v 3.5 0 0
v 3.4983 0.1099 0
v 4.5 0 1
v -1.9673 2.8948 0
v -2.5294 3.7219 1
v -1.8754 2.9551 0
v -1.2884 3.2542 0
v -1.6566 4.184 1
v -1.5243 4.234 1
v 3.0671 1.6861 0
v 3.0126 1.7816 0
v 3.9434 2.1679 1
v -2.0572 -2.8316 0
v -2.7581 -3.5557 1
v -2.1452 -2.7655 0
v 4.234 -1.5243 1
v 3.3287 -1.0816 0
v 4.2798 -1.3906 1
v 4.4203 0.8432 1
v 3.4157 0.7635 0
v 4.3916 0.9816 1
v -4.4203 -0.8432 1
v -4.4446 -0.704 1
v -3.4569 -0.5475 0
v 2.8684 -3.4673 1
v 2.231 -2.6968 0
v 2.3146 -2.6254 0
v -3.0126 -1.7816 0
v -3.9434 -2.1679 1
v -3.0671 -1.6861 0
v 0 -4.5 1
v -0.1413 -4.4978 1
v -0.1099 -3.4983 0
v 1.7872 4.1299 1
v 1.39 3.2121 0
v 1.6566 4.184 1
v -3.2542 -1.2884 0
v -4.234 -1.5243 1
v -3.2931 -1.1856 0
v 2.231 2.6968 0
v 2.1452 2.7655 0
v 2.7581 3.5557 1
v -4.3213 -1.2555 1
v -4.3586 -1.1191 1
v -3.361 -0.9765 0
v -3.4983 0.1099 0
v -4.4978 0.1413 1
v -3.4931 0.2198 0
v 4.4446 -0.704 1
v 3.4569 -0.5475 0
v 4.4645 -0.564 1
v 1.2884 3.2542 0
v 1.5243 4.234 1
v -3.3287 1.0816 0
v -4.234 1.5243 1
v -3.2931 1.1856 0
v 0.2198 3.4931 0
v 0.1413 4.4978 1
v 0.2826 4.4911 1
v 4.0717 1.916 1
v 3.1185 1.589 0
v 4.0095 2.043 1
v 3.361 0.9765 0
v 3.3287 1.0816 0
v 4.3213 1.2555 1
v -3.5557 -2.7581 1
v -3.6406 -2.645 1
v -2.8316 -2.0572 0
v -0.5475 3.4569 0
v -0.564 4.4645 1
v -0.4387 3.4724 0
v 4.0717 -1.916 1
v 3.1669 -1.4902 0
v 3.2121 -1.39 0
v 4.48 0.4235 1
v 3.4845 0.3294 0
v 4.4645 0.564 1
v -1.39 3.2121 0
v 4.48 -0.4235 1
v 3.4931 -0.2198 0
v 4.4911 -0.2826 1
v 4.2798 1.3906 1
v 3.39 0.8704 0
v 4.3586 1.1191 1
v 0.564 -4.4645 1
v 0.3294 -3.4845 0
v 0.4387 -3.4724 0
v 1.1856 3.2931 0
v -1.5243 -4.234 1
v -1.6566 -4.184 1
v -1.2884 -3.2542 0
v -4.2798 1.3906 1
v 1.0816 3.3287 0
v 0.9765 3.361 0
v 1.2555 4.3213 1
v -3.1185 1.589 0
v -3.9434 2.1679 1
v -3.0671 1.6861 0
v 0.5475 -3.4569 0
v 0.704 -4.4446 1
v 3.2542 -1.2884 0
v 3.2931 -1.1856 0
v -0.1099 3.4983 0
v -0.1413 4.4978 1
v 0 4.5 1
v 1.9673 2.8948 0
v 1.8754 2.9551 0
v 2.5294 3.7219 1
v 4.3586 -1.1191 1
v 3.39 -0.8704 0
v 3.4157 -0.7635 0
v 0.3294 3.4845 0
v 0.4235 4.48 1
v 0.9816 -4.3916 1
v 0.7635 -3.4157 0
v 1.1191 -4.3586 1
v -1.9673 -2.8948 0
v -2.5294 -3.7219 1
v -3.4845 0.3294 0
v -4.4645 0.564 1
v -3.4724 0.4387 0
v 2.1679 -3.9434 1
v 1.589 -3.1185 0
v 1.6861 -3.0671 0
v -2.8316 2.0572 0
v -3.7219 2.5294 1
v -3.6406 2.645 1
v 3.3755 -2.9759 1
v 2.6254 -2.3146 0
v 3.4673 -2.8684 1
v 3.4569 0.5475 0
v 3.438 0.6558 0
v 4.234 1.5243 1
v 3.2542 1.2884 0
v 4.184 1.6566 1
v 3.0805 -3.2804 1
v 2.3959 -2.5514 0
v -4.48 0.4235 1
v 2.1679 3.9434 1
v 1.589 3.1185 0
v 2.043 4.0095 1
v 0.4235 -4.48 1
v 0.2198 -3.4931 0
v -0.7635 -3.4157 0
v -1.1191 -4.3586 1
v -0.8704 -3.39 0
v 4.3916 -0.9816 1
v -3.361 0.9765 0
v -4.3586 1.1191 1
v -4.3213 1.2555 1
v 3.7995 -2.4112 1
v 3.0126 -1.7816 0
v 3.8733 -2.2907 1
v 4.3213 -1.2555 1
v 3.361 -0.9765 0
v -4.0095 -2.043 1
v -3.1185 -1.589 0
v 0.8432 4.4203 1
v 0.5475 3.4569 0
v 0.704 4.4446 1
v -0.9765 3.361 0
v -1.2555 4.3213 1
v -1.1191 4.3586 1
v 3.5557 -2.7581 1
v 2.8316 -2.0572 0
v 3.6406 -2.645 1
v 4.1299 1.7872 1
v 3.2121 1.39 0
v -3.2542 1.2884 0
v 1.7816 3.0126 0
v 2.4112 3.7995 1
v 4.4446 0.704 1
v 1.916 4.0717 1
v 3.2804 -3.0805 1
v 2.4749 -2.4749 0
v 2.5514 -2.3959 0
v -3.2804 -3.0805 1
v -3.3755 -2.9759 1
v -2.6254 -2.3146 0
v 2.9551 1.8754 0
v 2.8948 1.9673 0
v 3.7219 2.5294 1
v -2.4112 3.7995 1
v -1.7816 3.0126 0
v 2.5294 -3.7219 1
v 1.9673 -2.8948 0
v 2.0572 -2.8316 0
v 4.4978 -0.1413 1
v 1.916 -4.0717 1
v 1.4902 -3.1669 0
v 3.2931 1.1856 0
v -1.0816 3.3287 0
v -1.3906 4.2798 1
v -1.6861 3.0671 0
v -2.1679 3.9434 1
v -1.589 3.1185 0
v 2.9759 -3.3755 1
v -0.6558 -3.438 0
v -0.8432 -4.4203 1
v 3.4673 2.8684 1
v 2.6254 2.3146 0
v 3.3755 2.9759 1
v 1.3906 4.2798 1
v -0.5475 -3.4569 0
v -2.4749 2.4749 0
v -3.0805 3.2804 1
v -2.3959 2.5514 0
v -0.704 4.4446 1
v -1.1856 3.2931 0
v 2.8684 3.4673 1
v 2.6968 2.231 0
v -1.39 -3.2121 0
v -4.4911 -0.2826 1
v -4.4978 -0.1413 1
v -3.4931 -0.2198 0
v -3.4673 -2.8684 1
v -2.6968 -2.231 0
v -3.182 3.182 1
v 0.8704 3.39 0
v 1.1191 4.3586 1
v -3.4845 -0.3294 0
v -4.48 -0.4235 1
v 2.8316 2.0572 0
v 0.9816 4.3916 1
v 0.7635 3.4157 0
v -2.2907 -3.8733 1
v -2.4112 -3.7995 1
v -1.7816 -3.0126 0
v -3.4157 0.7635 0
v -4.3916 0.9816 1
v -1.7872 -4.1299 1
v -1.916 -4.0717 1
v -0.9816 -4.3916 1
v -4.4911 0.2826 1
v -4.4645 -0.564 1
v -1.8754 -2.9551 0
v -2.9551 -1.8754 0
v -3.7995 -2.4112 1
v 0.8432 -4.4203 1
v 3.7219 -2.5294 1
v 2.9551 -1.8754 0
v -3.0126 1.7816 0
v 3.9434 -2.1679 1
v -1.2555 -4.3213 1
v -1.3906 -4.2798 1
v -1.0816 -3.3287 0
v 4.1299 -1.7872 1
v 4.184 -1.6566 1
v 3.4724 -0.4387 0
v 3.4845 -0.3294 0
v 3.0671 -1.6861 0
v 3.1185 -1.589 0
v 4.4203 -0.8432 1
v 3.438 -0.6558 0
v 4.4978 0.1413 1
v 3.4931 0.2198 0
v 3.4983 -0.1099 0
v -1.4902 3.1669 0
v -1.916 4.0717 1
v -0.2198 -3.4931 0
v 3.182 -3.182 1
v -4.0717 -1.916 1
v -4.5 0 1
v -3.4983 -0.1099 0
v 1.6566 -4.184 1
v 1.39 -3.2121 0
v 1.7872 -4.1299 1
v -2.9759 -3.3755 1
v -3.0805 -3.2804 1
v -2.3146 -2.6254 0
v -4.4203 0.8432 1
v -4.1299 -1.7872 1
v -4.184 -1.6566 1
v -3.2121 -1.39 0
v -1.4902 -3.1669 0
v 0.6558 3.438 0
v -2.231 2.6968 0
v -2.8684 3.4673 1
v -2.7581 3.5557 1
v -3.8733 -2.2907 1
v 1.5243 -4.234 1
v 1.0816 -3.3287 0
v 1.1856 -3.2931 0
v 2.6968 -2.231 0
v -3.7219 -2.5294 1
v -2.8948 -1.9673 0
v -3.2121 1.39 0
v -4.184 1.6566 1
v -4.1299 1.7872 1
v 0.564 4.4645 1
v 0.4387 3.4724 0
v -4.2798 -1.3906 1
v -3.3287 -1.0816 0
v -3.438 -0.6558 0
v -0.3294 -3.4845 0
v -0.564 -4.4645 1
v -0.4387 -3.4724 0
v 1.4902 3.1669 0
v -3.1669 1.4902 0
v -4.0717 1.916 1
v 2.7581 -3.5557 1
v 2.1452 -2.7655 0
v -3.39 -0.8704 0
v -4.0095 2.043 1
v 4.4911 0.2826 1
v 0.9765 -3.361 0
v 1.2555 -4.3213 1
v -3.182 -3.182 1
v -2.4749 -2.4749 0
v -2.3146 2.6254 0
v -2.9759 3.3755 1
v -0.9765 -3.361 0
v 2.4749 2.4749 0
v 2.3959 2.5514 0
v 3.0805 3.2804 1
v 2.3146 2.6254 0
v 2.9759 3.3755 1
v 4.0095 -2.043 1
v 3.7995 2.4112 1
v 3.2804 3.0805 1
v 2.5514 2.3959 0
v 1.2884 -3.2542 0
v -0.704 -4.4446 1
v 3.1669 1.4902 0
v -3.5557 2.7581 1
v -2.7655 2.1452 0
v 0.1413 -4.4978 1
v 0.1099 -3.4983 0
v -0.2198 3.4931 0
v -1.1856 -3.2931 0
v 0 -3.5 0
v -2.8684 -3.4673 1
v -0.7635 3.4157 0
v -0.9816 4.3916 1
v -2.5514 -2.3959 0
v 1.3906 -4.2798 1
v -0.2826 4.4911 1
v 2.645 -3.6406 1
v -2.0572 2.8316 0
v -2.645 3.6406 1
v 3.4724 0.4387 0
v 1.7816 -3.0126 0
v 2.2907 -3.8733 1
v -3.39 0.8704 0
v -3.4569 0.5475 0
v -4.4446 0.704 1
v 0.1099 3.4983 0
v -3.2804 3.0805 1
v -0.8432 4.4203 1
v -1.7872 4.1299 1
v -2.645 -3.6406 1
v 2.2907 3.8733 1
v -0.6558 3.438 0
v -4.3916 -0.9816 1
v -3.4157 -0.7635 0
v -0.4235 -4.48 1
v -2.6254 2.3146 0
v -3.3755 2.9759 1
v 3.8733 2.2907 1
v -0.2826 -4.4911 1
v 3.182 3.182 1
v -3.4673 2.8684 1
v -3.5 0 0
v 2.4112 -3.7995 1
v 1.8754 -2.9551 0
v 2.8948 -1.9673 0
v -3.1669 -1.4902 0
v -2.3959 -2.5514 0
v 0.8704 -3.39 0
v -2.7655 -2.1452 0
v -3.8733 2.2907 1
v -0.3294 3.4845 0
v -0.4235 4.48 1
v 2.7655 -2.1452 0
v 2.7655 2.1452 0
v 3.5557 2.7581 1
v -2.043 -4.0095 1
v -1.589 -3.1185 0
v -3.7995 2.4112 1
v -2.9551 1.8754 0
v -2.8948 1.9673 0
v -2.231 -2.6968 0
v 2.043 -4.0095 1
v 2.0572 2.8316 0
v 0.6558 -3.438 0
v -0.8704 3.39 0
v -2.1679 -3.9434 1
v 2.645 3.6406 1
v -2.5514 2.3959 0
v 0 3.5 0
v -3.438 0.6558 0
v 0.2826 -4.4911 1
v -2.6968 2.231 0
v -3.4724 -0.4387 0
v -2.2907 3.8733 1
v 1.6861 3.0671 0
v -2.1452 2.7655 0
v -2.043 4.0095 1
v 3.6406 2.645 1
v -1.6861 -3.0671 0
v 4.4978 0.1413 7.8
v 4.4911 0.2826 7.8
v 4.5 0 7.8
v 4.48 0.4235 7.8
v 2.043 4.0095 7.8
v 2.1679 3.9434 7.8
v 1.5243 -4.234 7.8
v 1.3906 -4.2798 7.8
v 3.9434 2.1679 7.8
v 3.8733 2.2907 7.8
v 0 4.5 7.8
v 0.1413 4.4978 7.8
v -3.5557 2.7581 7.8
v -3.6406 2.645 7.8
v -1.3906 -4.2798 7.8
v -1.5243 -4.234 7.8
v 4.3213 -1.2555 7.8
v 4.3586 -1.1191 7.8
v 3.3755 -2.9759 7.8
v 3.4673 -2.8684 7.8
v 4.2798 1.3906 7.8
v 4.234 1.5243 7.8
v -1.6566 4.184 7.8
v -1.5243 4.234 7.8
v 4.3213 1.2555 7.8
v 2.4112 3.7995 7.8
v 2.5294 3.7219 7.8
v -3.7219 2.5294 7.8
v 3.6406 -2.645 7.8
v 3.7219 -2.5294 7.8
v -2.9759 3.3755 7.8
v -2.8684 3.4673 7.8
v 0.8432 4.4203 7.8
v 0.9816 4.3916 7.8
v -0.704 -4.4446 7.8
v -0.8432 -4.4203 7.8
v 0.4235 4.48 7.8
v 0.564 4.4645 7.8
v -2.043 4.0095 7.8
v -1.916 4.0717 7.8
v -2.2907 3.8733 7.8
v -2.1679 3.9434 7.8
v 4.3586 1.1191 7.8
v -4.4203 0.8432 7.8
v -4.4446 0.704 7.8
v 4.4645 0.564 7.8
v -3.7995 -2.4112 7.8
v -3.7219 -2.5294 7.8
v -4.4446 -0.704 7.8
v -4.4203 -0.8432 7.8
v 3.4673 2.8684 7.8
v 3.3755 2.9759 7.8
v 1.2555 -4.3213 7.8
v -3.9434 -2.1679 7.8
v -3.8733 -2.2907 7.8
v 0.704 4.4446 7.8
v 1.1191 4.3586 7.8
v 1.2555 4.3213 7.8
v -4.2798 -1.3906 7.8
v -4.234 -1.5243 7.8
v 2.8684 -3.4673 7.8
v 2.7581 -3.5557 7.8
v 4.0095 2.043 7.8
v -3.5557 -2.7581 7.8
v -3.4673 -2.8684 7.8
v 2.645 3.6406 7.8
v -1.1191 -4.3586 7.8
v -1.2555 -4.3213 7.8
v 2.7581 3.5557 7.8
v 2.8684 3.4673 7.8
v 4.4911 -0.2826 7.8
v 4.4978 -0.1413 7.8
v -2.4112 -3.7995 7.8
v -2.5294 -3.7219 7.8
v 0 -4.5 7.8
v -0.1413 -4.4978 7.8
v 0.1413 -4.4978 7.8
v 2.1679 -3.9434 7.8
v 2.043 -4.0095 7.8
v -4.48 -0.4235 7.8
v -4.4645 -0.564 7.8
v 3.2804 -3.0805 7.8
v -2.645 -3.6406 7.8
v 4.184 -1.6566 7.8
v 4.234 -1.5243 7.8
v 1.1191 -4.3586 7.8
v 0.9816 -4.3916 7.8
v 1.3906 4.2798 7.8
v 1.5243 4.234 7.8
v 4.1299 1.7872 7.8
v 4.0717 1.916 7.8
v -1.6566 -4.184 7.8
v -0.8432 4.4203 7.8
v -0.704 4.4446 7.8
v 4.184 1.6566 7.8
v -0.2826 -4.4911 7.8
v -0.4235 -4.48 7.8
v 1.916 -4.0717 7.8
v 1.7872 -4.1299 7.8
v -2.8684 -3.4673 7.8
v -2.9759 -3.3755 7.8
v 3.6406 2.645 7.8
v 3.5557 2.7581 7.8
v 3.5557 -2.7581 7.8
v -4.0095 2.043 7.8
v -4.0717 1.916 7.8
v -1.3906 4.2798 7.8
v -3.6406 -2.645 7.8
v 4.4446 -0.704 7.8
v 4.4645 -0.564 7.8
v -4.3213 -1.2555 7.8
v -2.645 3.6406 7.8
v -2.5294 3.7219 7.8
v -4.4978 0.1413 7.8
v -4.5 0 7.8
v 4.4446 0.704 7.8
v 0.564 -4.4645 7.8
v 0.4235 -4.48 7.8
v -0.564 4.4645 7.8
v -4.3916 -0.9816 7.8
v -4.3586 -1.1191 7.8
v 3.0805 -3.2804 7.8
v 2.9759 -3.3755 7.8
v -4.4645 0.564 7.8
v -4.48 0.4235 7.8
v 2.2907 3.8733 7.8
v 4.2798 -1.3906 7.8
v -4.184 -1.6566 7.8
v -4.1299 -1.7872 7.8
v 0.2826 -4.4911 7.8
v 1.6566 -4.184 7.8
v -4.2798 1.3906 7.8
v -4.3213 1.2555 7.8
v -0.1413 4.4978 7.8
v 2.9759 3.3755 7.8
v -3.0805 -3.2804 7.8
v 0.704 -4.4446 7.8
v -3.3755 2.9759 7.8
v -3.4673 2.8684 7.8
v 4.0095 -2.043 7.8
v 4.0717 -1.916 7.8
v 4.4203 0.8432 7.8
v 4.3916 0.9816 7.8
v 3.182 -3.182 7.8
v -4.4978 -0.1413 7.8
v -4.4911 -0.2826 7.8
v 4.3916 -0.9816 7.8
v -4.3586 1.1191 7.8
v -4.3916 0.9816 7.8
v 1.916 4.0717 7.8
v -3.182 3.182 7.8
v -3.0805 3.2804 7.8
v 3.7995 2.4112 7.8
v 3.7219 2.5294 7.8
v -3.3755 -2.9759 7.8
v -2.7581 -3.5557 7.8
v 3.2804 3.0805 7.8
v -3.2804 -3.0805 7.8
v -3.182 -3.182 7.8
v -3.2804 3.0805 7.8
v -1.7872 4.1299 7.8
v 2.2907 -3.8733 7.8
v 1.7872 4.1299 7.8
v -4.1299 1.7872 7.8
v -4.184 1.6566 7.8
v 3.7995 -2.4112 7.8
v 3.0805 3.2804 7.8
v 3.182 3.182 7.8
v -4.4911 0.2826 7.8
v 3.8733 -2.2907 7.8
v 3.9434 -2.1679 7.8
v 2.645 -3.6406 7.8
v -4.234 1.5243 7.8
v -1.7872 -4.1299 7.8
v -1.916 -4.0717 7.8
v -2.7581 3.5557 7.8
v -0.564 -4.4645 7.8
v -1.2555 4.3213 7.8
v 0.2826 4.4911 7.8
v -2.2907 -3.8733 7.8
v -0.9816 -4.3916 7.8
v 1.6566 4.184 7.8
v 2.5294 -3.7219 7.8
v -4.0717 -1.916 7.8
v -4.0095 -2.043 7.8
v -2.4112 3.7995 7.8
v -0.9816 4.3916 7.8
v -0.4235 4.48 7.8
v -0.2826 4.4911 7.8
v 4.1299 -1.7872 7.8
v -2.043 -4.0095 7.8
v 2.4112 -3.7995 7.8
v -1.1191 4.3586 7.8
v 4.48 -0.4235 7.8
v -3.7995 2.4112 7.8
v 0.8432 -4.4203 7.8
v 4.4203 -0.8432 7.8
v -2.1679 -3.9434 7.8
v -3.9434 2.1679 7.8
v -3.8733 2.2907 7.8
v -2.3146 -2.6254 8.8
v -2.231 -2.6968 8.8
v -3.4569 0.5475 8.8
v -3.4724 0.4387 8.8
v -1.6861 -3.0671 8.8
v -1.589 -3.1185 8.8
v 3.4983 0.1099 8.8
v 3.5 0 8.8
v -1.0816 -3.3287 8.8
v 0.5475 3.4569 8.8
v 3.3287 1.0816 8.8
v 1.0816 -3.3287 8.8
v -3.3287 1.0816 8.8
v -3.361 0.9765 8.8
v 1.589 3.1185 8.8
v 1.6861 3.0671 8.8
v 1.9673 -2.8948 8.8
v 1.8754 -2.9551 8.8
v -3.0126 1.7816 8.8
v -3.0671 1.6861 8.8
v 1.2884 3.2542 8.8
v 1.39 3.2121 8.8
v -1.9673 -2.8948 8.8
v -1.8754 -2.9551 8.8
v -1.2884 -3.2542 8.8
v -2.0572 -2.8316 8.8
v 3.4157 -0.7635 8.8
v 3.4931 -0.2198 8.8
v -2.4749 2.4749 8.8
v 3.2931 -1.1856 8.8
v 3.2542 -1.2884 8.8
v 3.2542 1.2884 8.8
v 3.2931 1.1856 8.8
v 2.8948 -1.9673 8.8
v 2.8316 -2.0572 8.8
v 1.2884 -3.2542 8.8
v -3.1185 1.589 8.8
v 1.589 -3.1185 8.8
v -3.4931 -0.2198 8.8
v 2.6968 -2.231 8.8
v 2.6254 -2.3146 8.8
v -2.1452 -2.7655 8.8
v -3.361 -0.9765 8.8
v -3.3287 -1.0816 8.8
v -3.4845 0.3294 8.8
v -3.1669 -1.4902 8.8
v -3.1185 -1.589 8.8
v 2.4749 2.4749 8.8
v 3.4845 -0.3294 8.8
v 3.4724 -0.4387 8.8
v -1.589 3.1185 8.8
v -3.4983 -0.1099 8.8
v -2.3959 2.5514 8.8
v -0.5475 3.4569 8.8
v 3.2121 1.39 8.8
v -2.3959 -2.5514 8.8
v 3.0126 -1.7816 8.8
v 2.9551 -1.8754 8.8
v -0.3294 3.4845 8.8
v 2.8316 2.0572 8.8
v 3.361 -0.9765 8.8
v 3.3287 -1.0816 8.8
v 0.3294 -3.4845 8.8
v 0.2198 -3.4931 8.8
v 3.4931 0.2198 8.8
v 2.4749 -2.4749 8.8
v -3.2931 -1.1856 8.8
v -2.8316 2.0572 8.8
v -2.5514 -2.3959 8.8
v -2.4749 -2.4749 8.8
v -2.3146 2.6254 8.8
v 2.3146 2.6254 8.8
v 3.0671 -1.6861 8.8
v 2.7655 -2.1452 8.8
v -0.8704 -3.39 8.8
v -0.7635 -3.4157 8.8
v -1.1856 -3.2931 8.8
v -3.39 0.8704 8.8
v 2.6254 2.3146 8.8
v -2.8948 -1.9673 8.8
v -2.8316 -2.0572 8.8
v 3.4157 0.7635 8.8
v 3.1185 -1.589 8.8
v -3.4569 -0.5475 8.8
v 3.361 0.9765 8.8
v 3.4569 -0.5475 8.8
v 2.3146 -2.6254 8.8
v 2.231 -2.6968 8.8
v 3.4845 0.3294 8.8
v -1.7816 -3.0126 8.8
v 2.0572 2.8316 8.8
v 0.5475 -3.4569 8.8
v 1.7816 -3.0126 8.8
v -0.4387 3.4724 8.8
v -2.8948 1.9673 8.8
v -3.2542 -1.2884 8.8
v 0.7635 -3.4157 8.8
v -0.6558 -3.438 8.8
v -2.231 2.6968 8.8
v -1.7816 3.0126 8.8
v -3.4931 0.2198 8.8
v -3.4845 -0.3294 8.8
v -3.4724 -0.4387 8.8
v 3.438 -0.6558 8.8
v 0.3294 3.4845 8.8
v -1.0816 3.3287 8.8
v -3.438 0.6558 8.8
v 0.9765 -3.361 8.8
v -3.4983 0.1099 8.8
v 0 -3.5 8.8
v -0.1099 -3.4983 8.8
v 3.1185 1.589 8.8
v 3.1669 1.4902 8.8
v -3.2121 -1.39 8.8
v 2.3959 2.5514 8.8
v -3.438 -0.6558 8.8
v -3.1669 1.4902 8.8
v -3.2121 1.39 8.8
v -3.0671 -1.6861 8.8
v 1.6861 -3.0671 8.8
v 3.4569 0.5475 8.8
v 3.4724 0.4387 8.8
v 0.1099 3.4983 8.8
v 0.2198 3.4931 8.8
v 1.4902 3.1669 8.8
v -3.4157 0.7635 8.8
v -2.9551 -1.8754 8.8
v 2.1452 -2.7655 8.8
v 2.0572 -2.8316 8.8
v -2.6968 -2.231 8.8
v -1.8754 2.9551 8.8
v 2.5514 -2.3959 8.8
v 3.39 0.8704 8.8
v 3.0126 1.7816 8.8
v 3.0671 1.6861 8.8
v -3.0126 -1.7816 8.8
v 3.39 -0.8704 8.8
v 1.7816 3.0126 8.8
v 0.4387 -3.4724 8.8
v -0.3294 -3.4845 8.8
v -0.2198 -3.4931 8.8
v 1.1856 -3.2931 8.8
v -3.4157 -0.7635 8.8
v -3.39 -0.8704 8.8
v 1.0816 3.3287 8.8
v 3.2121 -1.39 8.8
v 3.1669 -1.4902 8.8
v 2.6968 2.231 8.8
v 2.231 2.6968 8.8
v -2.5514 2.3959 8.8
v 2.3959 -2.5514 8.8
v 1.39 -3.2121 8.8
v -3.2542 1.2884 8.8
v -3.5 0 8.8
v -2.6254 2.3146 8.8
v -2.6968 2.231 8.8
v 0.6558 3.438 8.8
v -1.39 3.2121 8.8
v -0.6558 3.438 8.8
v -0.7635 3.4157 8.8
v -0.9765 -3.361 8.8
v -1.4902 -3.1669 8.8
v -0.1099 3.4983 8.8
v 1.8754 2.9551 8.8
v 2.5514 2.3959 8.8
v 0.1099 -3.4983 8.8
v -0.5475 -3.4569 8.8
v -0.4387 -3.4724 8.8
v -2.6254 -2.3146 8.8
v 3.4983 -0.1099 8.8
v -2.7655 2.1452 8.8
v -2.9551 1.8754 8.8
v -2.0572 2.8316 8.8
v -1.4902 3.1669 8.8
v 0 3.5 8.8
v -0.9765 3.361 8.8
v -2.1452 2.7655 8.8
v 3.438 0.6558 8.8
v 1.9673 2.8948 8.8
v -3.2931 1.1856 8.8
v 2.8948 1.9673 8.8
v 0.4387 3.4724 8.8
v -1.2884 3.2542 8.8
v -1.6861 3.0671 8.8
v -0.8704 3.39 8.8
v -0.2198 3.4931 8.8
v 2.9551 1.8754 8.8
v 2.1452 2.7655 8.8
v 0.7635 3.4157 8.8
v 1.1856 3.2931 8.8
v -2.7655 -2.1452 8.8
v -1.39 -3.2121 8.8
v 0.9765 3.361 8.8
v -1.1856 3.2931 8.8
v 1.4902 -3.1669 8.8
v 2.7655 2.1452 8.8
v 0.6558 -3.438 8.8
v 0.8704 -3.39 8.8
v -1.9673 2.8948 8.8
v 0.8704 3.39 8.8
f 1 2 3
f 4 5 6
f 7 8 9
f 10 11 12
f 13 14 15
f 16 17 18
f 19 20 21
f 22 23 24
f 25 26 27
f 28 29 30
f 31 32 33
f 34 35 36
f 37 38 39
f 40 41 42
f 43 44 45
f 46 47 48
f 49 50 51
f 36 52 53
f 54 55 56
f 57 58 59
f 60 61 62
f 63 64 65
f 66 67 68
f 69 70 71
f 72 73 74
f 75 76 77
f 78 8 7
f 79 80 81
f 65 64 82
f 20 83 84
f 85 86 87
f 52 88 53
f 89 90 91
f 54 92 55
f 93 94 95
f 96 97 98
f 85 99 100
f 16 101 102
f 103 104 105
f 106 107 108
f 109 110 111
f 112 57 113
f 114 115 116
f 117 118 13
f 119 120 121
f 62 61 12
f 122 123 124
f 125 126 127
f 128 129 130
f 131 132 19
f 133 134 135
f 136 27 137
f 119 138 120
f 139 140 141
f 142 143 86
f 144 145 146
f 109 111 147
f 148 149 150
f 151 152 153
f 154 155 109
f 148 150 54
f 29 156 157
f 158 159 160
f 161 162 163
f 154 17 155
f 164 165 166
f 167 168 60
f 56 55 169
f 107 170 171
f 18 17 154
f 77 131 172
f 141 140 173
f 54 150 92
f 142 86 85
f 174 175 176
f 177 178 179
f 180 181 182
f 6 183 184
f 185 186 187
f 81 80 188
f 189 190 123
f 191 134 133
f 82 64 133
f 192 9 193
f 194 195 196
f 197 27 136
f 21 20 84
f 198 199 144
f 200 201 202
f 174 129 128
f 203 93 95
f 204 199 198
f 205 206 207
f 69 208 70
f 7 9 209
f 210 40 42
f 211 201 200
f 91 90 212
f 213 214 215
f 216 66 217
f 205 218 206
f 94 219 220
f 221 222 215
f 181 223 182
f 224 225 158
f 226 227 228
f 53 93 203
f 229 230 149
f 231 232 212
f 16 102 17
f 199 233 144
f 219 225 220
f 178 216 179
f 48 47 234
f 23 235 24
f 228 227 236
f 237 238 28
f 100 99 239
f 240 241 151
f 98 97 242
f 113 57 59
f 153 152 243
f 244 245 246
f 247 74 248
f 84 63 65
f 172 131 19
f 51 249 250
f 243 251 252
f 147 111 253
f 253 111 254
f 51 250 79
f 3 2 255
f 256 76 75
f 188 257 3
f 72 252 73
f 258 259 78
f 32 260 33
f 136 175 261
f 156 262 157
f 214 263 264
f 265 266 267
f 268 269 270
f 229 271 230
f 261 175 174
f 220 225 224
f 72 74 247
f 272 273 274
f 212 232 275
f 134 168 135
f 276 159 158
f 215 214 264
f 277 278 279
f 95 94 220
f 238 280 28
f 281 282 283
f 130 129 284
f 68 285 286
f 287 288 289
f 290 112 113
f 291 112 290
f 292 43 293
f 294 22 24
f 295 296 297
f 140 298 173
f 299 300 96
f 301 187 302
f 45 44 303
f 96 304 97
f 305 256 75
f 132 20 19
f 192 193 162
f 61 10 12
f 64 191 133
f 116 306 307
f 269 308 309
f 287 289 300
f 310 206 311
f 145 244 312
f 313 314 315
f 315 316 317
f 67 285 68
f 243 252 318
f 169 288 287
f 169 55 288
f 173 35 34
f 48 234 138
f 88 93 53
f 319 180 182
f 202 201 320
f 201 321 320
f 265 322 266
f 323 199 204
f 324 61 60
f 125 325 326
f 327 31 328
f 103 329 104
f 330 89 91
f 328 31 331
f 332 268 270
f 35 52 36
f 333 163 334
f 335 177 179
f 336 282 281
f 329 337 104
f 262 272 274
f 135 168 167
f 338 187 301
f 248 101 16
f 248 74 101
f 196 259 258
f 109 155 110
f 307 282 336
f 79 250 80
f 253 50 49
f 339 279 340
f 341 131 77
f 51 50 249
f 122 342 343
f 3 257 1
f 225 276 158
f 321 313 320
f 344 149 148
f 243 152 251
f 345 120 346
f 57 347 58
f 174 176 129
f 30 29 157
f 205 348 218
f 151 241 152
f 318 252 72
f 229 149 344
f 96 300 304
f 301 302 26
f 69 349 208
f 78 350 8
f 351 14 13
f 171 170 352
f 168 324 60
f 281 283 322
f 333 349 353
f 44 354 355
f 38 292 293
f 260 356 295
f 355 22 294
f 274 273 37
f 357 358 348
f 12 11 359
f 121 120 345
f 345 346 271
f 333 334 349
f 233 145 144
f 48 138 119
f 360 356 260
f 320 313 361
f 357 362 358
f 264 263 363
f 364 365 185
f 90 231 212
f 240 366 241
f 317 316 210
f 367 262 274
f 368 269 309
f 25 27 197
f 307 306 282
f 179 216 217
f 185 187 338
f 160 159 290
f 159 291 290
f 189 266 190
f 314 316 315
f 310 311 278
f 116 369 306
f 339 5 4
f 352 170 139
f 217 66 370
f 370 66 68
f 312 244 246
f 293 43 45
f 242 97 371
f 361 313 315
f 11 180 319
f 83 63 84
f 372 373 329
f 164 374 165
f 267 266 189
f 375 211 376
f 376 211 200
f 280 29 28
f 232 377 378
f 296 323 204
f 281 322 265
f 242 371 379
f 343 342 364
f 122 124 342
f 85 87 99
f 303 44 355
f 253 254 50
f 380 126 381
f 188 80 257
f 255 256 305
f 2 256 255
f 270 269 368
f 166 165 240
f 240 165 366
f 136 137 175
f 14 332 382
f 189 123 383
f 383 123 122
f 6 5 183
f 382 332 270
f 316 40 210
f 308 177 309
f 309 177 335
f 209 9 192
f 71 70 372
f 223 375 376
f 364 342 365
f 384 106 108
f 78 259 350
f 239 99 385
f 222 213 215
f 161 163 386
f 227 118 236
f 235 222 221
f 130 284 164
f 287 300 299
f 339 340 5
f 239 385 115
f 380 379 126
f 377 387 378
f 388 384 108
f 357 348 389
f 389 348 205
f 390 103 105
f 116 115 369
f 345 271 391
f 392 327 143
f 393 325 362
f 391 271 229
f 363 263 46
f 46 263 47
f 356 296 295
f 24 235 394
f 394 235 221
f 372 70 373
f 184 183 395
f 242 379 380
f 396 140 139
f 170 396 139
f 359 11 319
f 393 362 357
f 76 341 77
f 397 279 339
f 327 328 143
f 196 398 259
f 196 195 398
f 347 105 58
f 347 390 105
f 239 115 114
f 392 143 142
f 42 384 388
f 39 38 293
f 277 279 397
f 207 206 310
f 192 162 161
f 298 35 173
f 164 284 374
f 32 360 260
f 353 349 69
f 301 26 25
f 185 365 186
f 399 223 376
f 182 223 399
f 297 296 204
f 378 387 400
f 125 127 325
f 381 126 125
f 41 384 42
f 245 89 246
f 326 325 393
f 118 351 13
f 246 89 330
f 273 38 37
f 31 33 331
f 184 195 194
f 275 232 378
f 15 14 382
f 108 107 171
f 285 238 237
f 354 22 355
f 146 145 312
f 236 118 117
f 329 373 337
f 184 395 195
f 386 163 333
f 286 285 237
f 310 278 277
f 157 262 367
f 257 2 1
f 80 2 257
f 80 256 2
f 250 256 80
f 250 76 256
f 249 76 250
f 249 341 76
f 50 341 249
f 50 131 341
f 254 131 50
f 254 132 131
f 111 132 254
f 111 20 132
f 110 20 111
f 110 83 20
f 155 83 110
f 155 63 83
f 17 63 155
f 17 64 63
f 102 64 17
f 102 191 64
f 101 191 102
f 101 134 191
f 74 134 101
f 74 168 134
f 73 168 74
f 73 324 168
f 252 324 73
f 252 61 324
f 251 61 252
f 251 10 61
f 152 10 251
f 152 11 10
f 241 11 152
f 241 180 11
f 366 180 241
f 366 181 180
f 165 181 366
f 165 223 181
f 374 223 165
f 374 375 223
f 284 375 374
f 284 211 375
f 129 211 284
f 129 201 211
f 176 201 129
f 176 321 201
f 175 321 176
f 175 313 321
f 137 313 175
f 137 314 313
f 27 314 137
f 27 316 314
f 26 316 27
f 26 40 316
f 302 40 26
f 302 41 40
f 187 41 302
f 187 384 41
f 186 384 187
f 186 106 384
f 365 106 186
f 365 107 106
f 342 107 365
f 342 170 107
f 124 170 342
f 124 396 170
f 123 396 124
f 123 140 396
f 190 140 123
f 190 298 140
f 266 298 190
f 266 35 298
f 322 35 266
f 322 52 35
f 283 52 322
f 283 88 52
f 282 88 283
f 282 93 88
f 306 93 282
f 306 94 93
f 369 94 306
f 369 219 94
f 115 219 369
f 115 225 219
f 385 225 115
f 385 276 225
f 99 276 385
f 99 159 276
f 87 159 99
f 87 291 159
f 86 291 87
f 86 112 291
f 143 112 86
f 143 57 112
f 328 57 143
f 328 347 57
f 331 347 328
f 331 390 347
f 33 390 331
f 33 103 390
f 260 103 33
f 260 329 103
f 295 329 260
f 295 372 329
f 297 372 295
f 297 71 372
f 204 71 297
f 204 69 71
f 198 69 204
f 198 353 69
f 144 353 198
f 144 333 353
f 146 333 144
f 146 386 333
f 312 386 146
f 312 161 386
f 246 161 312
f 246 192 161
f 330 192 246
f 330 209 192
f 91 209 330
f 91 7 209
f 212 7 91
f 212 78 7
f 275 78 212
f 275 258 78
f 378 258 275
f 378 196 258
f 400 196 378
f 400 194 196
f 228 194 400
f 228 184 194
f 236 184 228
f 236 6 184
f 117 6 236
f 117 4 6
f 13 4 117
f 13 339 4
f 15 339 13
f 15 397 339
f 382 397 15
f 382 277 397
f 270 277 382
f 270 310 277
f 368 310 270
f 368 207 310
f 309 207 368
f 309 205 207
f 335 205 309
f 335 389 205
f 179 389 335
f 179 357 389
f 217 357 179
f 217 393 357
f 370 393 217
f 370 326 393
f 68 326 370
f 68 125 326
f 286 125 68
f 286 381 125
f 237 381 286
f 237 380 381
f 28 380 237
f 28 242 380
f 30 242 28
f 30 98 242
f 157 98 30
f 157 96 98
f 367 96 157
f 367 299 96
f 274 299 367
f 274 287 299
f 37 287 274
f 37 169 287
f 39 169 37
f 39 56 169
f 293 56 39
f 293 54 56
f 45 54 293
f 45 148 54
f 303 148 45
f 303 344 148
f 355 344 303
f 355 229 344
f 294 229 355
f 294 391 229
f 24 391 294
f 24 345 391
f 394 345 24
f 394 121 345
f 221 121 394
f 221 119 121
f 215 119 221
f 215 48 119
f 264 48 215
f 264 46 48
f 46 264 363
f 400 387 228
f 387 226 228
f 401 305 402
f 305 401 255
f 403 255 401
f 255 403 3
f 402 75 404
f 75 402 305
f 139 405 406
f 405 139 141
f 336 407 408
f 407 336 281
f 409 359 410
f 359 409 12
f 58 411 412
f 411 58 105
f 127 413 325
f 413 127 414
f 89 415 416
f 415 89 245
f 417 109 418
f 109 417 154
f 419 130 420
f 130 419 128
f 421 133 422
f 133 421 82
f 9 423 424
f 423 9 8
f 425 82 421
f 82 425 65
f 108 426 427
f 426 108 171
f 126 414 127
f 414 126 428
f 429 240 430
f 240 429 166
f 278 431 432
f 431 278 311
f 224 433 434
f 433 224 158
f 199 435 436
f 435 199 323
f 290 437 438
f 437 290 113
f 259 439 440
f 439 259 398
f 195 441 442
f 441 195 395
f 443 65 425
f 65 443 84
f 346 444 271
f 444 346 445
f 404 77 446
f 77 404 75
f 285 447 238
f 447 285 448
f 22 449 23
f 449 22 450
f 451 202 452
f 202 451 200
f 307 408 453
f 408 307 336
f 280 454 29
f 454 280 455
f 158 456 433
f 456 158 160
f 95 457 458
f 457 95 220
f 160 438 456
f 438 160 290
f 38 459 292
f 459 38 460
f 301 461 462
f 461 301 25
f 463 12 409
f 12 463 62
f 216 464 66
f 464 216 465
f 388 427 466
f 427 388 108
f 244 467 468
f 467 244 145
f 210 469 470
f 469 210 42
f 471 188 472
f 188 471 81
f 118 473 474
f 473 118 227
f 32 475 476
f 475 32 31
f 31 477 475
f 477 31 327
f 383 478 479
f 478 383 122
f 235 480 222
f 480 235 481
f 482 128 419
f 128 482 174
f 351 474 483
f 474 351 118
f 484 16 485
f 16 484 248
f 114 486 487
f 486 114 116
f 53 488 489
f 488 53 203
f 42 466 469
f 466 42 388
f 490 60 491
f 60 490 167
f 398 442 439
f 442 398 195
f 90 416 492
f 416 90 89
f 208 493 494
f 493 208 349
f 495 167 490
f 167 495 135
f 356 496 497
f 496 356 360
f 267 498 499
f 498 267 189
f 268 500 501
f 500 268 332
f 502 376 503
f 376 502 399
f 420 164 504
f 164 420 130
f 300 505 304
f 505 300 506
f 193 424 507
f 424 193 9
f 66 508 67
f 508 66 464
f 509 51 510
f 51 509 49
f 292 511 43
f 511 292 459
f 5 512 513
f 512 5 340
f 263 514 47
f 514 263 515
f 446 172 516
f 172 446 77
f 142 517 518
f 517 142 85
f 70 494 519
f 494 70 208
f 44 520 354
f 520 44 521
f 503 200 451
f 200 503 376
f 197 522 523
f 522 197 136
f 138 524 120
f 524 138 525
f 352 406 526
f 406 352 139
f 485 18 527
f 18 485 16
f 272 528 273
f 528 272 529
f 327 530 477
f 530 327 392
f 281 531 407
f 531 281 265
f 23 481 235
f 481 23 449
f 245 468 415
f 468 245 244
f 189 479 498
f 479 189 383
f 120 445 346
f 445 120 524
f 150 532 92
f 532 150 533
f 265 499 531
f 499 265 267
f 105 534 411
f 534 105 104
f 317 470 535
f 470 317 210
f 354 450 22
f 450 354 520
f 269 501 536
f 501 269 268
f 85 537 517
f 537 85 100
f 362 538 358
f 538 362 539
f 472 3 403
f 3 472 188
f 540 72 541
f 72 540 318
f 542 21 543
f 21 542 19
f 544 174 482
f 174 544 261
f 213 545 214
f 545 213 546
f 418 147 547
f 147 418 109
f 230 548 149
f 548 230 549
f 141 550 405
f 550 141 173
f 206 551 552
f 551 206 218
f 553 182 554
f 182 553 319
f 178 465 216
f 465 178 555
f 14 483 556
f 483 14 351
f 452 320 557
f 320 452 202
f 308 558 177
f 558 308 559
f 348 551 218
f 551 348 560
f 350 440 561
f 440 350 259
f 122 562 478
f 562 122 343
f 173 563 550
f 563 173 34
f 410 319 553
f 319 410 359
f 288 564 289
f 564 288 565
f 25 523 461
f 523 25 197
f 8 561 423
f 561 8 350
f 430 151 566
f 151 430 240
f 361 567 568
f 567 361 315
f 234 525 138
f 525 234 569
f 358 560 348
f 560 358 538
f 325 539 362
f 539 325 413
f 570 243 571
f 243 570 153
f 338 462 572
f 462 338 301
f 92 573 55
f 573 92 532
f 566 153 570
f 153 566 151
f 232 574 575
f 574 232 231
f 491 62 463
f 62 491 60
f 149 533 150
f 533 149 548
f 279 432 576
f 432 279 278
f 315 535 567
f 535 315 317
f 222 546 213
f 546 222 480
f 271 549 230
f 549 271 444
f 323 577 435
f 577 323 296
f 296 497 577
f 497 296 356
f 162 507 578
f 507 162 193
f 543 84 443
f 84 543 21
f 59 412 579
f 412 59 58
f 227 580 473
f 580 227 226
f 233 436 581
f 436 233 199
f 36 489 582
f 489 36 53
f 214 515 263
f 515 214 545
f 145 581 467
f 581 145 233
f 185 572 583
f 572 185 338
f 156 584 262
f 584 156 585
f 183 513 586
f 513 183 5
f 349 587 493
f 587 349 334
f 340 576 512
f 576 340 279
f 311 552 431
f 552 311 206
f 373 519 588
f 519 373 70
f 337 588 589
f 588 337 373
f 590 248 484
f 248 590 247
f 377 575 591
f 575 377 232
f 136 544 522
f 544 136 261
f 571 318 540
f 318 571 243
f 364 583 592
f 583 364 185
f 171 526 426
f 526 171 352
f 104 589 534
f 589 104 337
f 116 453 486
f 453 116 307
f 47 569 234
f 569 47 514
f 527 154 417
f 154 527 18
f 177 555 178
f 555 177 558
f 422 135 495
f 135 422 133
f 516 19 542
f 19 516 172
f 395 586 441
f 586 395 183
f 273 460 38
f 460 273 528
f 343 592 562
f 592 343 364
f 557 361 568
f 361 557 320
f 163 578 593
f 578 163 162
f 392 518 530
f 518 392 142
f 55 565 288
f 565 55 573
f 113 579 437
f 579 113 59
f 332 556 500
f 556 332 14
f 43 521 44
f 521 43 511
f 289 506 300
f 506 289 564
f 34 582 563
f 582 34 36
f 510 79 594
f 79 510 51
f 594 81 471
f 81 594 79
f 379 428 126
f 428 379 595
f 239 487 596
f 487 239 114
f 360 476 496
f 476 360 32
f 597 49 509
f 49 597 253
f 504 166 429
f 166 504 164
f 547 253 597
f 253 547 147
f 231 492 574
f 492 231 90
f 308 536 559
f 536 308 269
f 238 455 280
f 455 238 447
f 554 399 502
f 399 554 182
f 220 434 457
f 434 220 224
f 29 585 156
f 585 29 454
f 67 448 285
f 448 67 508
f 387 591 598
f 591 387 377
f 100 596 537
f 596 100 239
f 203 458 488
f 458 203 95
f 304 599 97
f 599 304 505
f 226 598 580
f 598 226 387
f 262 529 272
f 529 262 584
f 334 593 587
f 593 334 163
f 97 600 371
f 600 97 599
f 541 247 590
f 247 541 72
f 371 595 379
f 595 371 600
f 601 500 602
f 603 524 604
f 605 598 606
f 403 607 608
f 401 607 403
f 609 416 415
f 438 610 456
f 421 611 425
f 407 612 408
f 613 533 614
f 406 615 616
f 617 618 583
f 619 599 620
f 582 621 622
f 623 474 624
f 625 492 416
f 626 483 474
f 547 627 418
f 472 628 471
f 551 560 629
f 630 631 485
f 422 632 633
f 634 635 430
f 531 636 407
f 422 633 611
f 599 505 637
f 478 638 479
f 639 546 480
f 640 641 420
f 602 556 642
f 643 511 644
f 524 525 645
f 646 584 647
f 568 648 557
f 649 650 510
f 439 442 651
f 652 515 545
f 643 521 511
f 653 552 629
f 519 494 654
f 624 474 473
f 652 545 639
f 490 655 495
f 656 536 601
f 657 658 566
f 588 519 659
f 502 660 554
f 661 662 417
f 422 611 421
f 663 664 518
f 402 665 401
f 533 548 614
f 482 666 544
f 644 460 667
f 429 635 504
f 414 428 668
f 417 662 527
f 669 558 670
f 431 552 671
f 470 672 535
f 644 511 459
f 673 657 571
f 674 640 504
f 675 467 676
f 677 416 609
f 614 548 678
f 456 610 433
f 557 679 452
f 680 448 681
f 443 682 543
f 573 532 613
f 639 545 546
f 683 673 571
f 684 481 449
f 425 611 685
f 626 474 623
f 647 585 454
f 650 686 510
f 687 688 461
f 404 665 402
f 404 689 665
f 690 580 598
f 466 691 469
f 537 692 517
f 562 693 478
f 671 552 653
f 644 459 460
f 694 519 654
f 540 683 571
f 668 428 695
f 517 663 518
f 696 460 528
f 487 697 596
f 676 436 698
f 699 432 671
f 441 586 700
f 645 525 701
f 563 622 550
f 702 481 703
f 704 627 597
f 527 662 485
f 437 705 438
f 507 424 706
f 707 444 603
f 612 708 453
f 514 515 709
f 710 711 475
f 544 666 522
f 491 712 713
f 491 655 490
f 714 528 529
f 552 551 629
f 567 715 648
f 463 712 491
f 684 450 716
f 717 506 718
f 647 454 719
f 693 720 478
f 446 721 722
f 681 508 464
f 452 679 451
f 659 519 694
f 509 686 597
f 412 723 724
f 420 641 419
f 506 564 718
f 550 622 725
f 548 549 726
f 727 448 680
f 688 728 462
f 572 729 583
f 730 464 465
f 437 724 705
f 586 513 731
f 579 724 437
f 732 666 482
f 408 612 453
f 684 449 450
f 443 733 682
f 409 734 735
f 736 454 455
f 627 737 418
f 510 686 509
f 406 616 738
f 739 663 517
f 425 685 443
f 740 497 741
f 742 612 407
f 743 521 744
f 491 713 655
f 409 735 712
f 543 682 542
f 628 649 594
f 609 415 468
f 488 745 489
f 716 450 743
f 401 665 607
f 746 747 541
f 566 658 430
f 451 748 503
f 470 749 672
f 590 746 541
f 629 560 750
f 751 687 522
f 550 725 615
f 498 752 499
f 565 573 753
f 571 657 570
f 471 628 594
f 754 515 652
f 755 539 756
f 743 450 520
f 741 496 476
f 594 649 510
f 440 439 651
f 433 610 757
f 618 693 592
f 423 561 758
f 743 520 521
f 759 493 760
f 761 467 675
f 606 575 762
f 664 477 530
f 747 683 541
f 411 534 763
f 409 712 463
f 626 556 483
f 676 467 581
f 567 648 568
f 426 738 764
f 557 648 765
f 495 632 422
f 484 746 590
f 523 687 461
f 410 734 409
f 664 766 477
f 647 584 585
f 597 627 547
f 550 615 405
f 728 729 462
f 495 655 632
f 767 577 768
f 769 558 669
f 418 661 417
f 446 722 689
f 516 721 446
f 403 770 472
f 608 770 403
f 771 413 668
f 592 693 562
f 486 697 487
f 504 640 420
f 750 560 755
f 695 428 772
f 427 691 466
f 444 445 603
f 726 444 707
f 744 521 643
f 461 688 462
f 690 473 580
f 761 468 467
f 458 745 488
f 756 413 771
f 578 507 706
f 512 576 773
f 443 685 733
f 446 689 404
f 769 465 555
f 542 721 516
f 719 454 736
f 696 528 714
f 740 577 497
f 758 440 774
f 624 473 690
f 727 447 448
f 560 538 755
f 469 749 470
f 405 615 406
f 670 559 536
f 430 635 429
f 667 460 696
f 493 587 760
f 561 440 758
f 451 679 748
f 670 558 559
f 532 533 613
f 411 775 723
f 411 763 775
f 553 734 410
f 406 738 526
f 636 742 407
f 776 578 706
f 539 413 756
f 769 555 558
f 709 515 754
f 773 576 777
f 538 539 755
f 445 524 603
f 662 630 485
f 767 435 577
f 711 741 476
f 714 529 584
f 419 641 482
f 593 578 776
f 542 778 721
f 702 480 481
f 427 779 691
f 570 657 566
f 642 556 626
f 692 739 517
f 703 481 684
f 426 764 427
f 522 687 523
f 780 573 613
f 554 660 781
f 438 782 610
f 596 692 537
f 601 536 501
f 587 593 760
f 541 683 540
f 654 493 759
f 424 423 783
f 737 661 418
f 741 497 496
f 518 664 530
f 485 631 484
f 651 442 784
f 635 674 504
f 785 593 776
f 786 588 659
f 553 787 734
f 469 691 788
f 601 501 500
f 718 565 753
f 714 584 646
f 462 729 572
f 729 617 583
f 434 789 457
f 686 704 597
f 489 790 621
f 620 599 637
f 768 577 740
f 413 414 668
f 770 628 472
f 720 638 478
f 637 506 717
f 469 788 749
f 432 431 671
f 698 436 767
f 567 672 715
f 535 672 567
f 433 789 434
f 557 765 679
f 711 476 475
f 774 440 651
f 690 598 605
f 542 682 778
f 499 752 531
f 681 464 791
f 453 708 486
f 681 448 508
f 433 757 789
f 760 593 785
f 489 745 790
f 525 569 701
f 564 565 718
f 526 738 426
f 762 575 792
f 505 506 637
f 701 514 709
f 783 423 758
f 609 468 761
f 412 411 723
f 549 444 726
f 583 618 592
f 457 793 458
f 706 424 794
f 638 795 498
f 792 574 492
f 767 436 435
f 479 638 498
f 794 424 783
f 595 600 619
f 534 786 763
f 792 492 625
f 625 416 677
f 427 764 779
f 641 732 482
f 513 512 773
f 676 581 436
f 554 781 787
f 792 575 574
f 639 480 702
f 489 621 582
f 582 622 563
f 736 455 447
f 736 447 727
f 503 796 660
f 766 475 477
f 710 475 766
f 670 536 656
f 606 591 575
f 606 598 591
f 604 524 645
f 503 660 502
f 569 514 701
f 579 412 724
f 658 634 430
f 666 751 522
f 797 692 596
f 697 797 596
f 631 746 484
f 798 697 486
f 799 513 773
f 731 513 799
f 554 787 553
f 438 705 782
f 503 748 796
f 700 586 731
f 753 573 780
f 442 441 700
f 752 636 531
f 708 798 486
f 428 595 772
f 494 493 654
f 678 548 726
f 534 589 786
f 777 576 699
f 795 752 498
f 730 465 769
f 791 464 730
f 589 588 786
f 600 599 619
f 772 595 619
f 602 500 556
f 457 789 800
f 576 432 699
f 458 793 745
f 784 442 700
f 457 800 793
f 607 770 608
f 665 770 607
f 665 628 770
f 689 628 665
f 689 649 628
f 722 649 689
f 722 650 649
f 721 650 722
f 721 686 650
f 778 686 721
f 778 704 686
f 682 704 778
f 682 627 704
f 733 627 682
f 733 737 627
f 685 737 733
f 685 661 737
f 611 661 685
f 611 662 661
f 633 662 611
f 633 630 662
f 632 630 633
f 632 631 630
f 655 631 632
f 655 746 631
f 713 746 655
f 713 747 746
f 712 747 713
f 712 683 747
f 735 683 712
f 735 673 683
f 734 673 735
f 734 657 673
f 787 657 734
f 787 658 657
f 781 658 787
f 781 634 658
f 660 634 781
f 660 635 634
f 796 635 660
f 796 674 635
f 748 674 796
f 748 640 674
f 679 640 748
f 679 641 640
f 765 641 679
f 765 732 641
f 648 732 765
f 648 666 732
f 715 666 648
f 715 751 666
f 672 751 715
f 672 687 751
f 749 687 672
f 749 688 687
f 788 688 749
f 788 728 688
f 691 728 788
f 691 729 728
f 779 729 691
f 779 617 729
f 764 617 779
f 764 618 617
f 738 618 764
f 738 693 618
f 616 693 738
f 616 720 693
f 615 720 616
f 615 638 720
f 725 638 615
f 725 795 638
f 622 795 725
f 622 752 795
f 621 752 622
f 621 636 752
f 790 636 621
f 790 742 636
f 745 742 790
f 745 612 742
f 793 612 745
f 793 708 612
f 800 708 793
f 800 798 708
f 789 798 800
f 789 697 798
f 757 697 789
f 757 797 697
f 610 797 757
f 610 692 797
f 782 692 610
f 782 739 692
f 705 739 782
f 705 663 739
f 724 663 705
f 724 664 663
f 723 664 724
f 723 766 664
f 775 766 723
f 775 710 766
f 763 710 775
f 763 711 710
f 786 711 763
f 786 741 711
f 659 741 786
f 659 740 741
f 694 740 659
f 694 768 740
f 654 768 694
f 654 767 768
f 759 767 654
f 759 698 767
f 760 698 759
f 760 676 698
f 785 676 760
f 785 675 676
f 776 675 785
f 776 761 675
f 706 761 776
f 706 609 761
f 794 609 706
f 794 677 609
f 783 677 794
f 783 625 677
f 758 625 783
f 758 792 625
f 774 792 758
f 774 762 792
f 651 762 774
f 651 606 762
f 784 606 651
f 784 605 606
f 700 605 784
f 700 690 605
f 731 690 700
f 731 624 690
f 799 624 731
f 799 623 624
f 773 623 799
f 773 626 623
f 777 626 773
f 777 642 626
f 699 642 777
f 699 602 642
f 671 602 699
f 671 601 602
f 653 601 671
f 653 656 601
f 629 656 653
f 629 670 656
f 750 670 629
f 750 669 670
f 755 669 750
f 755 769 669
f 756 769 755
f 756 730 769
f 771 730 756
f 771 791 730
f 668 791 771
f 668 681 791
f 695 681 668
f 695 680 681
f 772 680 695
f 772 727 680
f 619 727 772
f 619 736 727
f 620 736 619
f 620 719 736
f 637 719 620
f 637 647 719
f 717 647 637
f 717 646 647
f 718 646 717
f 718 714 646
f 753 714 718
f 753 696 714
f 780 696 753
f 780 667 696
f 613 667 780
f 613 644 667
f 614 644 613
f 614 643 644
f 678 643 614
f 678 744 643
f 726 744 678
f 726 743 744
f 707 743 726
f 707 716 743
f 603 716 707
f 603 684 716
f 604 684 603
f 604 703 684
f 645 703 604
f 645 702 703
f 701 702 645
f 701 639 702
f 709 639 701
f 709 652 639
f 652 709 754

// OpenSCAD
// slew1
// slewing joint with cross roller bearings


F1=200;              // $fn for rollers
F2=44;              // $fn for less critical

rod=9.0;           // roller outer diameter
rid=5.8;            //  roller inner diameter
rhi=rod-0.2;      // roller height
rbevel=1.0;           // z height of bevels
Nr = 9;            // half the number rollers

ofill=1;        // outer race fillet
ood=36-ofill;        // outer race outer rad
oid=17+ofill;         // outer race inner rad
ohi=13-2*ofill;         // outer race height

iooff=0.535;     // offset race in the boss

iogap=1;        // inner outer gap

Nholei=12;     // number holes inner
rholei=1.6;     // radius of holes inner
oholei=1.5;       // offset from edge

CutAngle=60;   // cutaway view if < 360

//-------------------------------
module roller1(tol=0){

difference(){
union(){
    // boss is stack of 3 cylinders
    translate([0,0,-tol])
    cylinder(r1=rod/2-rbevel,  r2=rod/2+tol, h=rbevel+tol, $fn=F1);

    translate([0,0,rbevel])
    cylinder(r=rod/2+tol, h=rhi-2*rbevel, $fn=F1);
        
    translate([0,0,rhi-rbevel])
    cylinder(r1=rod/2+tol,  r2=rod/2-rbevel, h=rbevel, $fn=F1);
}


}
}


//------------------------------------
module ring1(tol=0.1){
    
    difference(){
        // main ring
        rotate_extrude(angle=CutAngle,$fn=F1){
        translate([(ood+oid)/2,0,0])
        offset(r=ofill,$fn=F2)
        square([ood-oid,ohi],center=true);
        }

        // cut for races
        rotate_extrude($fn=F1){
        translate([(ood+oid)*iooff,0,0])
        rotate([0,0,45])
        offset(r=rbevel,$fn=F1)
        square([rod-rbevel*2+tol,
            rod-rbevel*2+tol],center=true);
        }
        
        // cut for bolts inner
        for(i=[0:Nholei-1]){
            rotate([0,0,360/Nholei*i])
            translate([oid+oholei,0,-1])
            cylinder(r=rholei,h=ohi*2,center=true,$fn=F2);
        }

    }
}

//---------------------------------
module outer1(){
    
    difference(){
        ring1();  
        // cut for outer ring
        cylinder(r=(ood+oid)*iooff+iogap/2,h=ohi*3,center=true,$fn=F1);
    }    
    
}
//---------------------------------
module inner1(){
    
    intersection(){
        ring1();  
        // cut for inner ring
        cylinder(r=(ood+oid)*iooff-iogap/2,h=ohi*3,center=true,$fn=F1);
    }   
    
}
//-----------------------------------
module innerLow(tol=0.1){
    difference(){
        inner1();
        
        translate([-ood,-ood,-tol])
        cube([ood*2,ood*2,20]);
    }
}

//-----------------------------------
module innerHi(tol=0.1){
    intersection(){
        inner1();
        
        translate([-ood,-ood,+tol])
        cube([ood*2,ood*2,20]);
    }
}

//--------------------------------
module gasket(){
    intersection(){
    inner1();
    cylinder(r=30,h=0.2,center=true);
}
}


//--------------------------------
module carrier(tol=-0.25){
    a1=360/Nr;
//    a1=360;
    r1=1.5; // corner cuts
    r2=1.0; // face cuts
    r0=rod/2-0.3;
    
    pts=[ [r0-r1,-r0],  [r0,-r0+r1],
          [r0,r0-r1], [r0-r1,r0],
          [-r0+r1,r0], [-r0,r0-r1],
          [-r0,-r0+r1], [-r0+r1,-r0] ];
    

difference(){
    
        rotate_extrude($fn=F1,angle=a1){
        translate([(ood+oid)*iooff,0,0])
        rotate([0,0,45])

        polygon(points=pts);

        }

for(i=[0:Nr-1]){
    rotate([0,0,360/Nr*i])

    color("red")
    translate([(ood+oid)*iooff,0,0])
    rotate([0,45,0])
    translate([0,0,-rhi/2-0.5])
    cylinder(r=rod/2+0.1, h=rhi+1, $fn=F1);

    rotate([0,0,360/Nr*i+360/Nr*0.32])
    color("pink")
    translate([(ood+oid)*iooff,0,0])
    rotate([0,45,0])
    translate([1.8,0,-rhi/2-0.5])
    cylinder(r=0.7, h=1, $fn=F1);

    color("cyan")
    rotate([0,0,360/Nr*i-360/Nr*0.33])
    translate([(ood+oid)*iooff,0,0])
    rotate([0,45,0])
    translate([1.8,0,-rhi/2-0.5])
    cylinder(r=0.8, h=1, $fn=4);
}
for(i=[0:Nr-1]){
    rotate([0,0,360/Nr*i+180/Nr])

    color("green")
    translate([(ood+oid)*iooff,0,0])
    rotate([0,-45,0])
    translate([0,0,-rhi/2-0.5])
    cylinder(r=rod/2+0.1, h=rhi+1, $fn=F1);
}


}

}

//=================================

if(0){
difference(){
carrier();
translate([22,-13,0])
rotate([0,0,180/Nr])
cube([40,40,40],center=true);    
}
}

//carrier();

if(0){
//for(i=[0]){
for(i=[0:Nr-1]){
    rotate([0,0,360/Nr*i])

    color("red")
    translate([(ood+oid)*iooff,0,0])
    rotate([0,45,0])
    translate([0,0,-rhi/2])
    roller1();
}
//for(i=[0]){
for(i=[0:Nr-1]){
    rotate([0,0,360/Nr*i+180/Nr])

    color("green")
    translate([(ood+oid)*iooff,0,0])
    rotate([0,-45,0])
    translate([0,0,-rhi/2])
    roller1();
}
}

roller1();

//outer1();

//innerHi();
//innerLow();

//gasket();
